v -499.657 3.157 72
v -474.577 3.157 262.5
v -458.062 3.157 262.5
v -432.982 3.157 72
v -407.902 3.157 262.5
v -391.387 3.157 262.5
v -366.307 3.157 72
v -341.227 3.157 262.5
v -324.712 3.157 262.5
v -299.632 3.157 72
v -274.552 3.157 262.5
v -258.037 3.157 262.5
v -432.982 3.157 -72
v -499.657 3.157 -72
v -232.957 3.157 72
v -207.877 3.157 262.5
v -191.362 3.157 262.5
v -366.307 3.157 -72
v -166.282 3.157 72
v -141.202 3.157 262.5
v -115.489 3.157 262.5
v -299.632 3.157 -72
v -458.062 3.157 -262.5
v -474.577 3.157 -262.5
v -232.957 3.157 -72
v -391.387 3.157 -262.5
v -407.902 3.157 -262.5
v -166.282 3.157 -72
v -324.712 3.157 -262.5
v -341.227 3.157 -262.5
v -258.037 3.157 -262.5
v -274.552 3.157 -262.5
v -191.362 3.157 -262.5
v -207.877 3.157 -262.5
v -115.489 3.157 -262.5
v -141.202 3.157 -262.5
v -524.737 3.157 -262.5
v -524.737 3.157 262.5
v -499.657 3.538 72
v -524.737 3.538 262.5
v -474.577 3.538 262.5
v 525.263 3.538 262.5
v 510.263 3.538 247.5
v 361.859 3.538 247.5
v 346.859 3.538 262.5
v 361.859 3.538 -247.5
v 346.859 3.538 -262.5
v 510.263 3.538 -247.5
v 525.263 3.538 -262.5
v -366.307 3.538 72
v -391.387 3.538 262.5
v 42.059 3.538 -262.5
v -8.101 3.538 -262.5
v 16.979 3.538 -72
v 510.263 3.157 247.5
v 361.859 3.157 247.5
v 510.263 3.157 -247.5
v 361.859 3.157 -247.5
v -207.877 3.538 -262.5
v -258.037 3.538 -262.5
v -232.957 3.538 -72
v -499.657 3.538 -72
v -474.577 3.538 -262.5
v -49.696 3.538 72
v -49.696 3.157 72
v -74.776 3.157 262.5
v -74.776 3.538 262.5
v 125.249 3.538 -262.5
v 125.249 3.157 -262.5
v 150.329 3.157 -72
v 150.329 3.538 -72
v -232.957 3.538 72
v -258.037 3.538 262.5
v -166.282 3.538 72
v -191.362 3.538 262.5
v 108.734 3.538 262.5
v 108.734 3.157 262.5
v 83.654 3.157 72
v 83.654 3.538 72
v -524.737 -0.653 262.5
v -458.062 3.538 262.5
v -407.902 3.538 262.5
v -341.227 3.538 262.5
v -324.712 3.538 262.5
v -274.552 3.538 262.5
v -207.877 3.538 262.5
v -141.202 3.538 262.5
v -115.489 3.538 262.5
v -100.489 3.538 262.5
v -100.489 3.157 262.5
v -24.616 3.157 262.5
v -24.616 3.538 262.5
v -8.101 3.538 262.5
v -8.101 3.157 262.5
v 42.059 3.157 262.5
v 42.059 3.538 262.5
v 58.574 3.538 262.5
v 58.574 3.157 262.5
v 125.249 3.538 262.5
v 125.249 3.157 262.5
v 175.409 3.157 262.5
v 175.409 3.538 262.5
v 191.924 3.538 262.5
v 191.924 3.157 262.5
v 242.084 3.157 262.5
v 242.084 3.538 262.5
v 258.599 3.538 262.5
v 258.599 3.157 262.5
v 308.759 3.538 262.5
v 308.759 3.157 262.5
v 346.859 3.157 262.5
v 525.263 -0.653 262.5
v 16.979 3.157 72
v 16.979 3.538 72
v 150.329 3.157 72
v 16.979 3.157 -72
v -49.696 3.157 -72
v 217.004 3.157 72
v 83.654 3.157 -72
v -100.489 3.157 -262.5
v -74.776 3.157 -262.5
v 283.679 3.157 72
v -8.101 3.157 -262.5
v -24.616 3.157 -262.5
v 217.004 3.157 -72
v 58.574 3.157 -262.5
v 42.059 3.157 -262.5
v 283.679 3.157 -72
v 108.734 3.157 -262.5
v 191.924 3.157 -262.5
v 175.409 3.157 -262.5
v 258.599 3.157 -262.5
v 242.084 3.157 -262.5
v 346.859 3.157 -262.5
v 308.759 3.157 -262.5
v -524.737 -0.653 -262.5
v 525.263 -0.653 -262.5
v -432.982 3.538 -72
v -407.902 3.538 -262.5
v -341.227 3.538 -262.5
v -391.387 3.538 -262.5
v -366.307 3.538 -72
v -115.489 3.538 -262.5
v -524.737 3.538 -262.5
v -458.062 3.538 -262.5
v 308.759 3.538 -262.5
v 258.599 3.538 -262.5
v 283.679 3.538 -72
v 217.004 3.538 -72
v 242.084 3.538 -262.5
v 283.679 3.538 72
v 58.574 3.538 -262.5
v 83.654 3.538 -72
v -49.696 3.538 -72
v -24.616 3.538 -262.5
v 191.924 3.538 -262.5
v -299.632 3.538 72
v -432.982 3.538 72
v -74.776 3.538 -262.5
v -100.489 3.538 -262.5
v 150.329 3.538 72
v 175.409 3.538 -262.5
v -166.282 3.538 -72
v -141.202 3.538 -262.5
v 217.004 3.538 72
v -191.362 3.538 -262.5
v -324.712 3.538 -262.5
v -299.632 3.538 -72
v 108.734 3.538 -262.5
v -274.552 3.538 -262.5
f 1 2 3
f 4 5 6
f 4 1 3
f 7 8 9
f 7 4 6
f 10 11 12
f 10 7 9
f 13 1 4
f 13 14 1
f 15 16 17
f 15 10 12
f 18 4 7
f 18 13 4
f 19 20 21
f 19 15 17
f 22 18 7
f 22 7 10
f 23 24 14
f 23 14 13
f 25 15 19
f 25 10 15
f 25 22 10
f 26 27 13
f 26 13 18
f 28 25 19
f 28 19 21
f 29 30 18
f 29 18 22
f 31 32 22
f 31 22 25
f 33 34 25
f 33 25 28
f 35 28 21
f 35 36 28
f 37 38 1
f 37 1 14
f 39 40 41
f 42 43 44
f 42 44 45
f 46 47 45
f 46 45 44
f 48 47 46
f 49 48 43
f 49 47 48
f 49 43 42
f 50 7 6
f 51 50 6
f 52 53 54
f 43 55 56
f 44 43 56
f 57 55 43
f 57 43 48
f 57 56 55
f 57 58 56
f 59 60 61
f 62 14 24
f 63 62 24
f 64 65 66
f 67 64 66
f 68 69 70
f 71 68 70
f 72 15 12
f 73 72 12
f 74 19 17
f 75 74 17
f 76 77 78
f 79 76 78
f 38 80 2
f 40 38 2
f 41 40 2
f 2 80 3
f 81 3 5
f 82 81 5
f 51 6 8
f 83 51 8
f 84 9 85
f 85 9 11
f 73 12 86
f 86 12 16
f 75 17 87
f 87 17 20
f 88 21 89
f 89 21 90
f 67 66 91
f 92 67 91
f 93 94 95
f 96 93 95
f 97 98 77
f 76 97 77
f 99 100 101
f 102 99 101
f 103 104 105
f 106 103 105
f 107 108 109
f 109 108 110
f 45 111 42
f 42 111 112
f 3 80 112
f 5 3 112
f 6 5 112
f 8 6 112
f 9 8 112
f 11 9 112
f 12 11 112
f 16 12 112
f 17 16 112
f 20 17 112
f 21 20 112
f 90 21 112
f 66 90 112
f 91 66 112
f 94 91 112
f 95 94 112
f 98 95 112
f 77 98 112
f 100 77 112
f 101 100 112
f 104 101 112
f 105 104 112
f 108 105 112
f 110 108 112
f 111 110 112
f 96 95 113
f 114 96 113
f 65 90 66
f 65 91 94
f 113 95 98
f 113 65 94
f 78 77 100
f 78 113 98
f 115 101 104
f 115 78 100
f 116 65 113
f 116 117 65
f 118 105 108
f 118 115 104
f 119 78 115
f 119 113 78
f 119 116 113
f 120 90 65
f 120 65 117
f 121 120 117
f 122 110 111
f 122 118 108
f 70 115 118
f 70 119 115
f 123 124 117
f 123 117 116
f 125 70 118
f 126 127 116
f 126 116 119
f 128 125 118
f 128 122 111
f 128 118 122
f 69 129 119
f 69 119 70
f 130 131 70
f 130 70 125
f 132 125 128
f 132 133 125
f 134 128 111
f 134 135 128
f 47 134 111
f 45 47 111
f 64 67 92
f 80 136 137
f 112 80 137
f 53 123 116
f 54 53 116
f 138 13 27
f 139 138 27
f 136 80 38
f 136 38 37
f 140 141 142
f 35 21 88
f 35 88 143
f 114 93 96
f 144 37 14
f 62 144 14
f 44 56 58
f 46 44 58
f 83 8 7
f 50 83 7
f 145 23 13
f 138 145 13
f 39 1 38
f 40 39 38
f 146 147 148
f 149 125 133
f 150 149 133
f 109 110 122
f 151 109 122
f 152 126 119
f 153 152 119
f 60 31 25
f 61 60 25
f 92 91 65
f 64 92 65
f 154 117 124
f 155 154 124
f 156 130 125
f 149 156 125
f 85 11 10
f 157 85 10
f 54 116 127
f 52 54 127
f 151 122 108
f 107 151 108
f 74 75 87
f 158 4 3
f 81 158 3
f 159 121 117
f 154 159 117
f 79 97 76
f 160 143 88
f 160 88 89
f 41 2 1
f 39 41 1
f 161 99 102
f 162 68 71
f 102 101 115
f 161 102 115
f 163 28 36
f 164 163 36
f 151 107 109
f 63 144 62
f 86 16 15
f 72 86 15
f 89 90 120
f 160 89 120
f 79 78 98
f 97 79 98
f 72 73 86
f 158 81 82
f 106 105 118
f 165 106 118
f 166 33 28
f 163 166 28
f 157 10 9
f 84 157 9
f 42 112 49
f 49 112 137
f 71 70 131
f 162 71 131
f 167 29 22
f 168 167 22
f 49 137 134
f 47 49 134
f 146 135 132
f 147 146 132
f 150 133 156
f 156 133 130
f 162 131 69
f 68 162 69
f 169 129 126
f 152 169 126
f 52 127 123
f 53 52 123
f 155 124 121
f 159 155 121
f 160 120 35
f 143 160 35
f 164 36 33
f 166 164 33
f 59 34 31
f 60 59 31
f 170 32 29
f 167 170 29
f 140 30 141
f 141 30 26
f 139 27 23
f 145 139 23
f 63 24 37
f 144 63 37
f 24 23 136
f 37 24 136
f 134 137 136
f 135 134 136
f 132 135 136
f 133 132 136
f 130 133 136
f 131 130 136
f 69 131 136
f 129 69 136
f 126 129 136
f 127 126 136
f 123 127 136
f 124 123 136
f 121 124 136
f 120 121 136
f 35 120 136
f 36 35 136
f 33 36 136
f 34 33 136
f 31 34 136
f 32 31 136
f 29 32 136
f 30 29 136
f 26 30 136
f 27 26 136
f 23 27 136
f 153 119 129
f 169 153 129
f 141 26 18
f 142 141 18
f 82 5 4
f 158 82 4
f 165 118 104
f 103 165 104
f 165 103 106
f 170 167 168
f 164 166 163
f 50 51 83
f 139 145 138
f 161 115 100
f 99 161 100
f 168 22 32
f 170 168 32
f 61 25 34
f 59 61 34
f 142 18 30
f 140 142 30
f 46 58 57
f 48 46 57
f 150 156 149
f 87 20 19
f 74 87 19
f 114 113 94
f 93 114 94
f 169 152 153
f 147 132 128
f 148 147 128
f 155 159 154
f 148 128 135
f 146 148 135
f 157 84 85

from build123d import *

# Parameters (mm, degrees)
SKETCH1_W           = 700
SKETCH1_H           = 350
BOSS_EXTRUDE1_DEPTH = 2.54
SKETCH2_W           = 10
SKETCH2_H           = 350
SKETCH2_H_2         = 330
BOSS_EXTRUDE2_DEPTH = 0.254
SCALE1_SCALE        = 1.5


with BuildPart() as part:
    # Sketch1 → Boss-Extrude1 (new body)
    with BuildSketch(Plane(origin=(0, 0, 0), x_dir=(1, 0, 0), z_dir=(0, 1, 0))):
        Rectangle(SKETCH1_W, SKETCH1_H)
    extrude(amount=BOSS_EXTRUDE1_DEPTH)

    # Sketch2 → Boss-Extrude2 (add)
    with BuildSketch(Plane(origin=(0, 2.54, 0), x_dir=(1, 0, 0), z_dir=(0, 1, 0))):
        Polygon((-316.560265613, 175), (-350, 175), (-333.280132806, 48), align=None)
        Polygon((-272.110265613, 175), (-305.55, 175), (-288.830132806, 48), align=None)
        Polygon((-227.660265613, 175), (-261.1, 175), (-244.380132806, 48), align=None)
        Polygon((-183.210265613, 175), (-216.65, 175), (-199.930132806, 48), align=None)
        Polygon((-138.760265613, 175), (-172.2, 175), (-155.480132806, 48), align=None)
        Polygon((-94.310265613, 175), (-127.75, 175), (-111.030132806, 48), align=None)
        with Locations((-72.168132806, 0)):
            Rectangle(SKETCH2_W, SKETCH2_H)
        Polygon((-16.586265613, 175), (-50.026, 175), (-33.306132806, 48), align=None)
        Polygon((27.863734387, 175), (-5.576, 175), (11.143867194, 48), align=None)
        Polygon((72.313734387, 175), (38.874, 175), (55.593867194, 48), align=None)
        Polygon((116.763734387, 175), (83.324, 175), (100.043867194, 48), align=None)
        Polygon((161.213734387, 175), (127.774, 175), (144.493867194, 48), align=None)
        Polygon((205.663734387, 175), (172.224, 175), (188.943867194, 48), align=None)
        Polygon((-350, -175), (-316.560265613, -175), (-333.280132806, -48), align=None)
        Polygon((-305.55, -175), (-272.110265613, -175), (-288.830132806, -48), align=None)
        Polygon((-261.1, -175), (-227.660265613, -175), (-244.380132806, -48), align=None)
        Polygon((-216.65, -175), (-183.210265613, -175), (-199.930132806, -48), align=None)
        Polygon((-172.2, -175), (-138.760265613, -175), (-155.480132806, -48), align=None)
        Polygon((-127.75, -175), (-94.310265613, -175), (-111.030132806, -48), align=None)
        Polygon((-33.306132806, -48), (-50.026, -175), (-16.586265613, -175), align=None)
        Polygon((11.143867194, -48), (-5.576, -175), (27.863734387, -175), align=None)
        Polygon((55.593867194, -48), (38.874, -175), (72.313734387, -175), align=None)
        Polygon((100.043867194, -48), (83.324, -175), (116.763734387, -175), align=None)
        Polygon((144.493867194, -48), (127.774, -175), (161.213734387, -175), align=None)
        Polygon((188.943867194, -48), (172.224, -175), (205.663734387, -175), align=None)
        Polygon((241.063734387, 175), (231.063734387, 175), (231.063734387, -175), (241.063734387, -175), (241.063734387, -165), (241.063734387, 165), align=None)
        Polygon((241.063734387, -165), (241.063734387, -175), (350, -175), (350, -165), (340, -165), align=None)
        with Locations((345, 0)):
            Rectangle(SKETCH2_W, SKETCH2_H_2)
        Polygon((350, 175), (241.063734387, 175), (241.063734387, 165), (340, 165), (350, 165), align=None)
    extrude(amount=BOSS_EXTRUDE2_DEPTH)


with BuildPart() as part_1:
    # Scale1: scaled about (-0.525903048, 1.305261187, 0)
    add(part.part.scale(SCALE1_SCALE).moved(Location((0.262951524, -0.652630593, 0))))


solid = part_1.part
